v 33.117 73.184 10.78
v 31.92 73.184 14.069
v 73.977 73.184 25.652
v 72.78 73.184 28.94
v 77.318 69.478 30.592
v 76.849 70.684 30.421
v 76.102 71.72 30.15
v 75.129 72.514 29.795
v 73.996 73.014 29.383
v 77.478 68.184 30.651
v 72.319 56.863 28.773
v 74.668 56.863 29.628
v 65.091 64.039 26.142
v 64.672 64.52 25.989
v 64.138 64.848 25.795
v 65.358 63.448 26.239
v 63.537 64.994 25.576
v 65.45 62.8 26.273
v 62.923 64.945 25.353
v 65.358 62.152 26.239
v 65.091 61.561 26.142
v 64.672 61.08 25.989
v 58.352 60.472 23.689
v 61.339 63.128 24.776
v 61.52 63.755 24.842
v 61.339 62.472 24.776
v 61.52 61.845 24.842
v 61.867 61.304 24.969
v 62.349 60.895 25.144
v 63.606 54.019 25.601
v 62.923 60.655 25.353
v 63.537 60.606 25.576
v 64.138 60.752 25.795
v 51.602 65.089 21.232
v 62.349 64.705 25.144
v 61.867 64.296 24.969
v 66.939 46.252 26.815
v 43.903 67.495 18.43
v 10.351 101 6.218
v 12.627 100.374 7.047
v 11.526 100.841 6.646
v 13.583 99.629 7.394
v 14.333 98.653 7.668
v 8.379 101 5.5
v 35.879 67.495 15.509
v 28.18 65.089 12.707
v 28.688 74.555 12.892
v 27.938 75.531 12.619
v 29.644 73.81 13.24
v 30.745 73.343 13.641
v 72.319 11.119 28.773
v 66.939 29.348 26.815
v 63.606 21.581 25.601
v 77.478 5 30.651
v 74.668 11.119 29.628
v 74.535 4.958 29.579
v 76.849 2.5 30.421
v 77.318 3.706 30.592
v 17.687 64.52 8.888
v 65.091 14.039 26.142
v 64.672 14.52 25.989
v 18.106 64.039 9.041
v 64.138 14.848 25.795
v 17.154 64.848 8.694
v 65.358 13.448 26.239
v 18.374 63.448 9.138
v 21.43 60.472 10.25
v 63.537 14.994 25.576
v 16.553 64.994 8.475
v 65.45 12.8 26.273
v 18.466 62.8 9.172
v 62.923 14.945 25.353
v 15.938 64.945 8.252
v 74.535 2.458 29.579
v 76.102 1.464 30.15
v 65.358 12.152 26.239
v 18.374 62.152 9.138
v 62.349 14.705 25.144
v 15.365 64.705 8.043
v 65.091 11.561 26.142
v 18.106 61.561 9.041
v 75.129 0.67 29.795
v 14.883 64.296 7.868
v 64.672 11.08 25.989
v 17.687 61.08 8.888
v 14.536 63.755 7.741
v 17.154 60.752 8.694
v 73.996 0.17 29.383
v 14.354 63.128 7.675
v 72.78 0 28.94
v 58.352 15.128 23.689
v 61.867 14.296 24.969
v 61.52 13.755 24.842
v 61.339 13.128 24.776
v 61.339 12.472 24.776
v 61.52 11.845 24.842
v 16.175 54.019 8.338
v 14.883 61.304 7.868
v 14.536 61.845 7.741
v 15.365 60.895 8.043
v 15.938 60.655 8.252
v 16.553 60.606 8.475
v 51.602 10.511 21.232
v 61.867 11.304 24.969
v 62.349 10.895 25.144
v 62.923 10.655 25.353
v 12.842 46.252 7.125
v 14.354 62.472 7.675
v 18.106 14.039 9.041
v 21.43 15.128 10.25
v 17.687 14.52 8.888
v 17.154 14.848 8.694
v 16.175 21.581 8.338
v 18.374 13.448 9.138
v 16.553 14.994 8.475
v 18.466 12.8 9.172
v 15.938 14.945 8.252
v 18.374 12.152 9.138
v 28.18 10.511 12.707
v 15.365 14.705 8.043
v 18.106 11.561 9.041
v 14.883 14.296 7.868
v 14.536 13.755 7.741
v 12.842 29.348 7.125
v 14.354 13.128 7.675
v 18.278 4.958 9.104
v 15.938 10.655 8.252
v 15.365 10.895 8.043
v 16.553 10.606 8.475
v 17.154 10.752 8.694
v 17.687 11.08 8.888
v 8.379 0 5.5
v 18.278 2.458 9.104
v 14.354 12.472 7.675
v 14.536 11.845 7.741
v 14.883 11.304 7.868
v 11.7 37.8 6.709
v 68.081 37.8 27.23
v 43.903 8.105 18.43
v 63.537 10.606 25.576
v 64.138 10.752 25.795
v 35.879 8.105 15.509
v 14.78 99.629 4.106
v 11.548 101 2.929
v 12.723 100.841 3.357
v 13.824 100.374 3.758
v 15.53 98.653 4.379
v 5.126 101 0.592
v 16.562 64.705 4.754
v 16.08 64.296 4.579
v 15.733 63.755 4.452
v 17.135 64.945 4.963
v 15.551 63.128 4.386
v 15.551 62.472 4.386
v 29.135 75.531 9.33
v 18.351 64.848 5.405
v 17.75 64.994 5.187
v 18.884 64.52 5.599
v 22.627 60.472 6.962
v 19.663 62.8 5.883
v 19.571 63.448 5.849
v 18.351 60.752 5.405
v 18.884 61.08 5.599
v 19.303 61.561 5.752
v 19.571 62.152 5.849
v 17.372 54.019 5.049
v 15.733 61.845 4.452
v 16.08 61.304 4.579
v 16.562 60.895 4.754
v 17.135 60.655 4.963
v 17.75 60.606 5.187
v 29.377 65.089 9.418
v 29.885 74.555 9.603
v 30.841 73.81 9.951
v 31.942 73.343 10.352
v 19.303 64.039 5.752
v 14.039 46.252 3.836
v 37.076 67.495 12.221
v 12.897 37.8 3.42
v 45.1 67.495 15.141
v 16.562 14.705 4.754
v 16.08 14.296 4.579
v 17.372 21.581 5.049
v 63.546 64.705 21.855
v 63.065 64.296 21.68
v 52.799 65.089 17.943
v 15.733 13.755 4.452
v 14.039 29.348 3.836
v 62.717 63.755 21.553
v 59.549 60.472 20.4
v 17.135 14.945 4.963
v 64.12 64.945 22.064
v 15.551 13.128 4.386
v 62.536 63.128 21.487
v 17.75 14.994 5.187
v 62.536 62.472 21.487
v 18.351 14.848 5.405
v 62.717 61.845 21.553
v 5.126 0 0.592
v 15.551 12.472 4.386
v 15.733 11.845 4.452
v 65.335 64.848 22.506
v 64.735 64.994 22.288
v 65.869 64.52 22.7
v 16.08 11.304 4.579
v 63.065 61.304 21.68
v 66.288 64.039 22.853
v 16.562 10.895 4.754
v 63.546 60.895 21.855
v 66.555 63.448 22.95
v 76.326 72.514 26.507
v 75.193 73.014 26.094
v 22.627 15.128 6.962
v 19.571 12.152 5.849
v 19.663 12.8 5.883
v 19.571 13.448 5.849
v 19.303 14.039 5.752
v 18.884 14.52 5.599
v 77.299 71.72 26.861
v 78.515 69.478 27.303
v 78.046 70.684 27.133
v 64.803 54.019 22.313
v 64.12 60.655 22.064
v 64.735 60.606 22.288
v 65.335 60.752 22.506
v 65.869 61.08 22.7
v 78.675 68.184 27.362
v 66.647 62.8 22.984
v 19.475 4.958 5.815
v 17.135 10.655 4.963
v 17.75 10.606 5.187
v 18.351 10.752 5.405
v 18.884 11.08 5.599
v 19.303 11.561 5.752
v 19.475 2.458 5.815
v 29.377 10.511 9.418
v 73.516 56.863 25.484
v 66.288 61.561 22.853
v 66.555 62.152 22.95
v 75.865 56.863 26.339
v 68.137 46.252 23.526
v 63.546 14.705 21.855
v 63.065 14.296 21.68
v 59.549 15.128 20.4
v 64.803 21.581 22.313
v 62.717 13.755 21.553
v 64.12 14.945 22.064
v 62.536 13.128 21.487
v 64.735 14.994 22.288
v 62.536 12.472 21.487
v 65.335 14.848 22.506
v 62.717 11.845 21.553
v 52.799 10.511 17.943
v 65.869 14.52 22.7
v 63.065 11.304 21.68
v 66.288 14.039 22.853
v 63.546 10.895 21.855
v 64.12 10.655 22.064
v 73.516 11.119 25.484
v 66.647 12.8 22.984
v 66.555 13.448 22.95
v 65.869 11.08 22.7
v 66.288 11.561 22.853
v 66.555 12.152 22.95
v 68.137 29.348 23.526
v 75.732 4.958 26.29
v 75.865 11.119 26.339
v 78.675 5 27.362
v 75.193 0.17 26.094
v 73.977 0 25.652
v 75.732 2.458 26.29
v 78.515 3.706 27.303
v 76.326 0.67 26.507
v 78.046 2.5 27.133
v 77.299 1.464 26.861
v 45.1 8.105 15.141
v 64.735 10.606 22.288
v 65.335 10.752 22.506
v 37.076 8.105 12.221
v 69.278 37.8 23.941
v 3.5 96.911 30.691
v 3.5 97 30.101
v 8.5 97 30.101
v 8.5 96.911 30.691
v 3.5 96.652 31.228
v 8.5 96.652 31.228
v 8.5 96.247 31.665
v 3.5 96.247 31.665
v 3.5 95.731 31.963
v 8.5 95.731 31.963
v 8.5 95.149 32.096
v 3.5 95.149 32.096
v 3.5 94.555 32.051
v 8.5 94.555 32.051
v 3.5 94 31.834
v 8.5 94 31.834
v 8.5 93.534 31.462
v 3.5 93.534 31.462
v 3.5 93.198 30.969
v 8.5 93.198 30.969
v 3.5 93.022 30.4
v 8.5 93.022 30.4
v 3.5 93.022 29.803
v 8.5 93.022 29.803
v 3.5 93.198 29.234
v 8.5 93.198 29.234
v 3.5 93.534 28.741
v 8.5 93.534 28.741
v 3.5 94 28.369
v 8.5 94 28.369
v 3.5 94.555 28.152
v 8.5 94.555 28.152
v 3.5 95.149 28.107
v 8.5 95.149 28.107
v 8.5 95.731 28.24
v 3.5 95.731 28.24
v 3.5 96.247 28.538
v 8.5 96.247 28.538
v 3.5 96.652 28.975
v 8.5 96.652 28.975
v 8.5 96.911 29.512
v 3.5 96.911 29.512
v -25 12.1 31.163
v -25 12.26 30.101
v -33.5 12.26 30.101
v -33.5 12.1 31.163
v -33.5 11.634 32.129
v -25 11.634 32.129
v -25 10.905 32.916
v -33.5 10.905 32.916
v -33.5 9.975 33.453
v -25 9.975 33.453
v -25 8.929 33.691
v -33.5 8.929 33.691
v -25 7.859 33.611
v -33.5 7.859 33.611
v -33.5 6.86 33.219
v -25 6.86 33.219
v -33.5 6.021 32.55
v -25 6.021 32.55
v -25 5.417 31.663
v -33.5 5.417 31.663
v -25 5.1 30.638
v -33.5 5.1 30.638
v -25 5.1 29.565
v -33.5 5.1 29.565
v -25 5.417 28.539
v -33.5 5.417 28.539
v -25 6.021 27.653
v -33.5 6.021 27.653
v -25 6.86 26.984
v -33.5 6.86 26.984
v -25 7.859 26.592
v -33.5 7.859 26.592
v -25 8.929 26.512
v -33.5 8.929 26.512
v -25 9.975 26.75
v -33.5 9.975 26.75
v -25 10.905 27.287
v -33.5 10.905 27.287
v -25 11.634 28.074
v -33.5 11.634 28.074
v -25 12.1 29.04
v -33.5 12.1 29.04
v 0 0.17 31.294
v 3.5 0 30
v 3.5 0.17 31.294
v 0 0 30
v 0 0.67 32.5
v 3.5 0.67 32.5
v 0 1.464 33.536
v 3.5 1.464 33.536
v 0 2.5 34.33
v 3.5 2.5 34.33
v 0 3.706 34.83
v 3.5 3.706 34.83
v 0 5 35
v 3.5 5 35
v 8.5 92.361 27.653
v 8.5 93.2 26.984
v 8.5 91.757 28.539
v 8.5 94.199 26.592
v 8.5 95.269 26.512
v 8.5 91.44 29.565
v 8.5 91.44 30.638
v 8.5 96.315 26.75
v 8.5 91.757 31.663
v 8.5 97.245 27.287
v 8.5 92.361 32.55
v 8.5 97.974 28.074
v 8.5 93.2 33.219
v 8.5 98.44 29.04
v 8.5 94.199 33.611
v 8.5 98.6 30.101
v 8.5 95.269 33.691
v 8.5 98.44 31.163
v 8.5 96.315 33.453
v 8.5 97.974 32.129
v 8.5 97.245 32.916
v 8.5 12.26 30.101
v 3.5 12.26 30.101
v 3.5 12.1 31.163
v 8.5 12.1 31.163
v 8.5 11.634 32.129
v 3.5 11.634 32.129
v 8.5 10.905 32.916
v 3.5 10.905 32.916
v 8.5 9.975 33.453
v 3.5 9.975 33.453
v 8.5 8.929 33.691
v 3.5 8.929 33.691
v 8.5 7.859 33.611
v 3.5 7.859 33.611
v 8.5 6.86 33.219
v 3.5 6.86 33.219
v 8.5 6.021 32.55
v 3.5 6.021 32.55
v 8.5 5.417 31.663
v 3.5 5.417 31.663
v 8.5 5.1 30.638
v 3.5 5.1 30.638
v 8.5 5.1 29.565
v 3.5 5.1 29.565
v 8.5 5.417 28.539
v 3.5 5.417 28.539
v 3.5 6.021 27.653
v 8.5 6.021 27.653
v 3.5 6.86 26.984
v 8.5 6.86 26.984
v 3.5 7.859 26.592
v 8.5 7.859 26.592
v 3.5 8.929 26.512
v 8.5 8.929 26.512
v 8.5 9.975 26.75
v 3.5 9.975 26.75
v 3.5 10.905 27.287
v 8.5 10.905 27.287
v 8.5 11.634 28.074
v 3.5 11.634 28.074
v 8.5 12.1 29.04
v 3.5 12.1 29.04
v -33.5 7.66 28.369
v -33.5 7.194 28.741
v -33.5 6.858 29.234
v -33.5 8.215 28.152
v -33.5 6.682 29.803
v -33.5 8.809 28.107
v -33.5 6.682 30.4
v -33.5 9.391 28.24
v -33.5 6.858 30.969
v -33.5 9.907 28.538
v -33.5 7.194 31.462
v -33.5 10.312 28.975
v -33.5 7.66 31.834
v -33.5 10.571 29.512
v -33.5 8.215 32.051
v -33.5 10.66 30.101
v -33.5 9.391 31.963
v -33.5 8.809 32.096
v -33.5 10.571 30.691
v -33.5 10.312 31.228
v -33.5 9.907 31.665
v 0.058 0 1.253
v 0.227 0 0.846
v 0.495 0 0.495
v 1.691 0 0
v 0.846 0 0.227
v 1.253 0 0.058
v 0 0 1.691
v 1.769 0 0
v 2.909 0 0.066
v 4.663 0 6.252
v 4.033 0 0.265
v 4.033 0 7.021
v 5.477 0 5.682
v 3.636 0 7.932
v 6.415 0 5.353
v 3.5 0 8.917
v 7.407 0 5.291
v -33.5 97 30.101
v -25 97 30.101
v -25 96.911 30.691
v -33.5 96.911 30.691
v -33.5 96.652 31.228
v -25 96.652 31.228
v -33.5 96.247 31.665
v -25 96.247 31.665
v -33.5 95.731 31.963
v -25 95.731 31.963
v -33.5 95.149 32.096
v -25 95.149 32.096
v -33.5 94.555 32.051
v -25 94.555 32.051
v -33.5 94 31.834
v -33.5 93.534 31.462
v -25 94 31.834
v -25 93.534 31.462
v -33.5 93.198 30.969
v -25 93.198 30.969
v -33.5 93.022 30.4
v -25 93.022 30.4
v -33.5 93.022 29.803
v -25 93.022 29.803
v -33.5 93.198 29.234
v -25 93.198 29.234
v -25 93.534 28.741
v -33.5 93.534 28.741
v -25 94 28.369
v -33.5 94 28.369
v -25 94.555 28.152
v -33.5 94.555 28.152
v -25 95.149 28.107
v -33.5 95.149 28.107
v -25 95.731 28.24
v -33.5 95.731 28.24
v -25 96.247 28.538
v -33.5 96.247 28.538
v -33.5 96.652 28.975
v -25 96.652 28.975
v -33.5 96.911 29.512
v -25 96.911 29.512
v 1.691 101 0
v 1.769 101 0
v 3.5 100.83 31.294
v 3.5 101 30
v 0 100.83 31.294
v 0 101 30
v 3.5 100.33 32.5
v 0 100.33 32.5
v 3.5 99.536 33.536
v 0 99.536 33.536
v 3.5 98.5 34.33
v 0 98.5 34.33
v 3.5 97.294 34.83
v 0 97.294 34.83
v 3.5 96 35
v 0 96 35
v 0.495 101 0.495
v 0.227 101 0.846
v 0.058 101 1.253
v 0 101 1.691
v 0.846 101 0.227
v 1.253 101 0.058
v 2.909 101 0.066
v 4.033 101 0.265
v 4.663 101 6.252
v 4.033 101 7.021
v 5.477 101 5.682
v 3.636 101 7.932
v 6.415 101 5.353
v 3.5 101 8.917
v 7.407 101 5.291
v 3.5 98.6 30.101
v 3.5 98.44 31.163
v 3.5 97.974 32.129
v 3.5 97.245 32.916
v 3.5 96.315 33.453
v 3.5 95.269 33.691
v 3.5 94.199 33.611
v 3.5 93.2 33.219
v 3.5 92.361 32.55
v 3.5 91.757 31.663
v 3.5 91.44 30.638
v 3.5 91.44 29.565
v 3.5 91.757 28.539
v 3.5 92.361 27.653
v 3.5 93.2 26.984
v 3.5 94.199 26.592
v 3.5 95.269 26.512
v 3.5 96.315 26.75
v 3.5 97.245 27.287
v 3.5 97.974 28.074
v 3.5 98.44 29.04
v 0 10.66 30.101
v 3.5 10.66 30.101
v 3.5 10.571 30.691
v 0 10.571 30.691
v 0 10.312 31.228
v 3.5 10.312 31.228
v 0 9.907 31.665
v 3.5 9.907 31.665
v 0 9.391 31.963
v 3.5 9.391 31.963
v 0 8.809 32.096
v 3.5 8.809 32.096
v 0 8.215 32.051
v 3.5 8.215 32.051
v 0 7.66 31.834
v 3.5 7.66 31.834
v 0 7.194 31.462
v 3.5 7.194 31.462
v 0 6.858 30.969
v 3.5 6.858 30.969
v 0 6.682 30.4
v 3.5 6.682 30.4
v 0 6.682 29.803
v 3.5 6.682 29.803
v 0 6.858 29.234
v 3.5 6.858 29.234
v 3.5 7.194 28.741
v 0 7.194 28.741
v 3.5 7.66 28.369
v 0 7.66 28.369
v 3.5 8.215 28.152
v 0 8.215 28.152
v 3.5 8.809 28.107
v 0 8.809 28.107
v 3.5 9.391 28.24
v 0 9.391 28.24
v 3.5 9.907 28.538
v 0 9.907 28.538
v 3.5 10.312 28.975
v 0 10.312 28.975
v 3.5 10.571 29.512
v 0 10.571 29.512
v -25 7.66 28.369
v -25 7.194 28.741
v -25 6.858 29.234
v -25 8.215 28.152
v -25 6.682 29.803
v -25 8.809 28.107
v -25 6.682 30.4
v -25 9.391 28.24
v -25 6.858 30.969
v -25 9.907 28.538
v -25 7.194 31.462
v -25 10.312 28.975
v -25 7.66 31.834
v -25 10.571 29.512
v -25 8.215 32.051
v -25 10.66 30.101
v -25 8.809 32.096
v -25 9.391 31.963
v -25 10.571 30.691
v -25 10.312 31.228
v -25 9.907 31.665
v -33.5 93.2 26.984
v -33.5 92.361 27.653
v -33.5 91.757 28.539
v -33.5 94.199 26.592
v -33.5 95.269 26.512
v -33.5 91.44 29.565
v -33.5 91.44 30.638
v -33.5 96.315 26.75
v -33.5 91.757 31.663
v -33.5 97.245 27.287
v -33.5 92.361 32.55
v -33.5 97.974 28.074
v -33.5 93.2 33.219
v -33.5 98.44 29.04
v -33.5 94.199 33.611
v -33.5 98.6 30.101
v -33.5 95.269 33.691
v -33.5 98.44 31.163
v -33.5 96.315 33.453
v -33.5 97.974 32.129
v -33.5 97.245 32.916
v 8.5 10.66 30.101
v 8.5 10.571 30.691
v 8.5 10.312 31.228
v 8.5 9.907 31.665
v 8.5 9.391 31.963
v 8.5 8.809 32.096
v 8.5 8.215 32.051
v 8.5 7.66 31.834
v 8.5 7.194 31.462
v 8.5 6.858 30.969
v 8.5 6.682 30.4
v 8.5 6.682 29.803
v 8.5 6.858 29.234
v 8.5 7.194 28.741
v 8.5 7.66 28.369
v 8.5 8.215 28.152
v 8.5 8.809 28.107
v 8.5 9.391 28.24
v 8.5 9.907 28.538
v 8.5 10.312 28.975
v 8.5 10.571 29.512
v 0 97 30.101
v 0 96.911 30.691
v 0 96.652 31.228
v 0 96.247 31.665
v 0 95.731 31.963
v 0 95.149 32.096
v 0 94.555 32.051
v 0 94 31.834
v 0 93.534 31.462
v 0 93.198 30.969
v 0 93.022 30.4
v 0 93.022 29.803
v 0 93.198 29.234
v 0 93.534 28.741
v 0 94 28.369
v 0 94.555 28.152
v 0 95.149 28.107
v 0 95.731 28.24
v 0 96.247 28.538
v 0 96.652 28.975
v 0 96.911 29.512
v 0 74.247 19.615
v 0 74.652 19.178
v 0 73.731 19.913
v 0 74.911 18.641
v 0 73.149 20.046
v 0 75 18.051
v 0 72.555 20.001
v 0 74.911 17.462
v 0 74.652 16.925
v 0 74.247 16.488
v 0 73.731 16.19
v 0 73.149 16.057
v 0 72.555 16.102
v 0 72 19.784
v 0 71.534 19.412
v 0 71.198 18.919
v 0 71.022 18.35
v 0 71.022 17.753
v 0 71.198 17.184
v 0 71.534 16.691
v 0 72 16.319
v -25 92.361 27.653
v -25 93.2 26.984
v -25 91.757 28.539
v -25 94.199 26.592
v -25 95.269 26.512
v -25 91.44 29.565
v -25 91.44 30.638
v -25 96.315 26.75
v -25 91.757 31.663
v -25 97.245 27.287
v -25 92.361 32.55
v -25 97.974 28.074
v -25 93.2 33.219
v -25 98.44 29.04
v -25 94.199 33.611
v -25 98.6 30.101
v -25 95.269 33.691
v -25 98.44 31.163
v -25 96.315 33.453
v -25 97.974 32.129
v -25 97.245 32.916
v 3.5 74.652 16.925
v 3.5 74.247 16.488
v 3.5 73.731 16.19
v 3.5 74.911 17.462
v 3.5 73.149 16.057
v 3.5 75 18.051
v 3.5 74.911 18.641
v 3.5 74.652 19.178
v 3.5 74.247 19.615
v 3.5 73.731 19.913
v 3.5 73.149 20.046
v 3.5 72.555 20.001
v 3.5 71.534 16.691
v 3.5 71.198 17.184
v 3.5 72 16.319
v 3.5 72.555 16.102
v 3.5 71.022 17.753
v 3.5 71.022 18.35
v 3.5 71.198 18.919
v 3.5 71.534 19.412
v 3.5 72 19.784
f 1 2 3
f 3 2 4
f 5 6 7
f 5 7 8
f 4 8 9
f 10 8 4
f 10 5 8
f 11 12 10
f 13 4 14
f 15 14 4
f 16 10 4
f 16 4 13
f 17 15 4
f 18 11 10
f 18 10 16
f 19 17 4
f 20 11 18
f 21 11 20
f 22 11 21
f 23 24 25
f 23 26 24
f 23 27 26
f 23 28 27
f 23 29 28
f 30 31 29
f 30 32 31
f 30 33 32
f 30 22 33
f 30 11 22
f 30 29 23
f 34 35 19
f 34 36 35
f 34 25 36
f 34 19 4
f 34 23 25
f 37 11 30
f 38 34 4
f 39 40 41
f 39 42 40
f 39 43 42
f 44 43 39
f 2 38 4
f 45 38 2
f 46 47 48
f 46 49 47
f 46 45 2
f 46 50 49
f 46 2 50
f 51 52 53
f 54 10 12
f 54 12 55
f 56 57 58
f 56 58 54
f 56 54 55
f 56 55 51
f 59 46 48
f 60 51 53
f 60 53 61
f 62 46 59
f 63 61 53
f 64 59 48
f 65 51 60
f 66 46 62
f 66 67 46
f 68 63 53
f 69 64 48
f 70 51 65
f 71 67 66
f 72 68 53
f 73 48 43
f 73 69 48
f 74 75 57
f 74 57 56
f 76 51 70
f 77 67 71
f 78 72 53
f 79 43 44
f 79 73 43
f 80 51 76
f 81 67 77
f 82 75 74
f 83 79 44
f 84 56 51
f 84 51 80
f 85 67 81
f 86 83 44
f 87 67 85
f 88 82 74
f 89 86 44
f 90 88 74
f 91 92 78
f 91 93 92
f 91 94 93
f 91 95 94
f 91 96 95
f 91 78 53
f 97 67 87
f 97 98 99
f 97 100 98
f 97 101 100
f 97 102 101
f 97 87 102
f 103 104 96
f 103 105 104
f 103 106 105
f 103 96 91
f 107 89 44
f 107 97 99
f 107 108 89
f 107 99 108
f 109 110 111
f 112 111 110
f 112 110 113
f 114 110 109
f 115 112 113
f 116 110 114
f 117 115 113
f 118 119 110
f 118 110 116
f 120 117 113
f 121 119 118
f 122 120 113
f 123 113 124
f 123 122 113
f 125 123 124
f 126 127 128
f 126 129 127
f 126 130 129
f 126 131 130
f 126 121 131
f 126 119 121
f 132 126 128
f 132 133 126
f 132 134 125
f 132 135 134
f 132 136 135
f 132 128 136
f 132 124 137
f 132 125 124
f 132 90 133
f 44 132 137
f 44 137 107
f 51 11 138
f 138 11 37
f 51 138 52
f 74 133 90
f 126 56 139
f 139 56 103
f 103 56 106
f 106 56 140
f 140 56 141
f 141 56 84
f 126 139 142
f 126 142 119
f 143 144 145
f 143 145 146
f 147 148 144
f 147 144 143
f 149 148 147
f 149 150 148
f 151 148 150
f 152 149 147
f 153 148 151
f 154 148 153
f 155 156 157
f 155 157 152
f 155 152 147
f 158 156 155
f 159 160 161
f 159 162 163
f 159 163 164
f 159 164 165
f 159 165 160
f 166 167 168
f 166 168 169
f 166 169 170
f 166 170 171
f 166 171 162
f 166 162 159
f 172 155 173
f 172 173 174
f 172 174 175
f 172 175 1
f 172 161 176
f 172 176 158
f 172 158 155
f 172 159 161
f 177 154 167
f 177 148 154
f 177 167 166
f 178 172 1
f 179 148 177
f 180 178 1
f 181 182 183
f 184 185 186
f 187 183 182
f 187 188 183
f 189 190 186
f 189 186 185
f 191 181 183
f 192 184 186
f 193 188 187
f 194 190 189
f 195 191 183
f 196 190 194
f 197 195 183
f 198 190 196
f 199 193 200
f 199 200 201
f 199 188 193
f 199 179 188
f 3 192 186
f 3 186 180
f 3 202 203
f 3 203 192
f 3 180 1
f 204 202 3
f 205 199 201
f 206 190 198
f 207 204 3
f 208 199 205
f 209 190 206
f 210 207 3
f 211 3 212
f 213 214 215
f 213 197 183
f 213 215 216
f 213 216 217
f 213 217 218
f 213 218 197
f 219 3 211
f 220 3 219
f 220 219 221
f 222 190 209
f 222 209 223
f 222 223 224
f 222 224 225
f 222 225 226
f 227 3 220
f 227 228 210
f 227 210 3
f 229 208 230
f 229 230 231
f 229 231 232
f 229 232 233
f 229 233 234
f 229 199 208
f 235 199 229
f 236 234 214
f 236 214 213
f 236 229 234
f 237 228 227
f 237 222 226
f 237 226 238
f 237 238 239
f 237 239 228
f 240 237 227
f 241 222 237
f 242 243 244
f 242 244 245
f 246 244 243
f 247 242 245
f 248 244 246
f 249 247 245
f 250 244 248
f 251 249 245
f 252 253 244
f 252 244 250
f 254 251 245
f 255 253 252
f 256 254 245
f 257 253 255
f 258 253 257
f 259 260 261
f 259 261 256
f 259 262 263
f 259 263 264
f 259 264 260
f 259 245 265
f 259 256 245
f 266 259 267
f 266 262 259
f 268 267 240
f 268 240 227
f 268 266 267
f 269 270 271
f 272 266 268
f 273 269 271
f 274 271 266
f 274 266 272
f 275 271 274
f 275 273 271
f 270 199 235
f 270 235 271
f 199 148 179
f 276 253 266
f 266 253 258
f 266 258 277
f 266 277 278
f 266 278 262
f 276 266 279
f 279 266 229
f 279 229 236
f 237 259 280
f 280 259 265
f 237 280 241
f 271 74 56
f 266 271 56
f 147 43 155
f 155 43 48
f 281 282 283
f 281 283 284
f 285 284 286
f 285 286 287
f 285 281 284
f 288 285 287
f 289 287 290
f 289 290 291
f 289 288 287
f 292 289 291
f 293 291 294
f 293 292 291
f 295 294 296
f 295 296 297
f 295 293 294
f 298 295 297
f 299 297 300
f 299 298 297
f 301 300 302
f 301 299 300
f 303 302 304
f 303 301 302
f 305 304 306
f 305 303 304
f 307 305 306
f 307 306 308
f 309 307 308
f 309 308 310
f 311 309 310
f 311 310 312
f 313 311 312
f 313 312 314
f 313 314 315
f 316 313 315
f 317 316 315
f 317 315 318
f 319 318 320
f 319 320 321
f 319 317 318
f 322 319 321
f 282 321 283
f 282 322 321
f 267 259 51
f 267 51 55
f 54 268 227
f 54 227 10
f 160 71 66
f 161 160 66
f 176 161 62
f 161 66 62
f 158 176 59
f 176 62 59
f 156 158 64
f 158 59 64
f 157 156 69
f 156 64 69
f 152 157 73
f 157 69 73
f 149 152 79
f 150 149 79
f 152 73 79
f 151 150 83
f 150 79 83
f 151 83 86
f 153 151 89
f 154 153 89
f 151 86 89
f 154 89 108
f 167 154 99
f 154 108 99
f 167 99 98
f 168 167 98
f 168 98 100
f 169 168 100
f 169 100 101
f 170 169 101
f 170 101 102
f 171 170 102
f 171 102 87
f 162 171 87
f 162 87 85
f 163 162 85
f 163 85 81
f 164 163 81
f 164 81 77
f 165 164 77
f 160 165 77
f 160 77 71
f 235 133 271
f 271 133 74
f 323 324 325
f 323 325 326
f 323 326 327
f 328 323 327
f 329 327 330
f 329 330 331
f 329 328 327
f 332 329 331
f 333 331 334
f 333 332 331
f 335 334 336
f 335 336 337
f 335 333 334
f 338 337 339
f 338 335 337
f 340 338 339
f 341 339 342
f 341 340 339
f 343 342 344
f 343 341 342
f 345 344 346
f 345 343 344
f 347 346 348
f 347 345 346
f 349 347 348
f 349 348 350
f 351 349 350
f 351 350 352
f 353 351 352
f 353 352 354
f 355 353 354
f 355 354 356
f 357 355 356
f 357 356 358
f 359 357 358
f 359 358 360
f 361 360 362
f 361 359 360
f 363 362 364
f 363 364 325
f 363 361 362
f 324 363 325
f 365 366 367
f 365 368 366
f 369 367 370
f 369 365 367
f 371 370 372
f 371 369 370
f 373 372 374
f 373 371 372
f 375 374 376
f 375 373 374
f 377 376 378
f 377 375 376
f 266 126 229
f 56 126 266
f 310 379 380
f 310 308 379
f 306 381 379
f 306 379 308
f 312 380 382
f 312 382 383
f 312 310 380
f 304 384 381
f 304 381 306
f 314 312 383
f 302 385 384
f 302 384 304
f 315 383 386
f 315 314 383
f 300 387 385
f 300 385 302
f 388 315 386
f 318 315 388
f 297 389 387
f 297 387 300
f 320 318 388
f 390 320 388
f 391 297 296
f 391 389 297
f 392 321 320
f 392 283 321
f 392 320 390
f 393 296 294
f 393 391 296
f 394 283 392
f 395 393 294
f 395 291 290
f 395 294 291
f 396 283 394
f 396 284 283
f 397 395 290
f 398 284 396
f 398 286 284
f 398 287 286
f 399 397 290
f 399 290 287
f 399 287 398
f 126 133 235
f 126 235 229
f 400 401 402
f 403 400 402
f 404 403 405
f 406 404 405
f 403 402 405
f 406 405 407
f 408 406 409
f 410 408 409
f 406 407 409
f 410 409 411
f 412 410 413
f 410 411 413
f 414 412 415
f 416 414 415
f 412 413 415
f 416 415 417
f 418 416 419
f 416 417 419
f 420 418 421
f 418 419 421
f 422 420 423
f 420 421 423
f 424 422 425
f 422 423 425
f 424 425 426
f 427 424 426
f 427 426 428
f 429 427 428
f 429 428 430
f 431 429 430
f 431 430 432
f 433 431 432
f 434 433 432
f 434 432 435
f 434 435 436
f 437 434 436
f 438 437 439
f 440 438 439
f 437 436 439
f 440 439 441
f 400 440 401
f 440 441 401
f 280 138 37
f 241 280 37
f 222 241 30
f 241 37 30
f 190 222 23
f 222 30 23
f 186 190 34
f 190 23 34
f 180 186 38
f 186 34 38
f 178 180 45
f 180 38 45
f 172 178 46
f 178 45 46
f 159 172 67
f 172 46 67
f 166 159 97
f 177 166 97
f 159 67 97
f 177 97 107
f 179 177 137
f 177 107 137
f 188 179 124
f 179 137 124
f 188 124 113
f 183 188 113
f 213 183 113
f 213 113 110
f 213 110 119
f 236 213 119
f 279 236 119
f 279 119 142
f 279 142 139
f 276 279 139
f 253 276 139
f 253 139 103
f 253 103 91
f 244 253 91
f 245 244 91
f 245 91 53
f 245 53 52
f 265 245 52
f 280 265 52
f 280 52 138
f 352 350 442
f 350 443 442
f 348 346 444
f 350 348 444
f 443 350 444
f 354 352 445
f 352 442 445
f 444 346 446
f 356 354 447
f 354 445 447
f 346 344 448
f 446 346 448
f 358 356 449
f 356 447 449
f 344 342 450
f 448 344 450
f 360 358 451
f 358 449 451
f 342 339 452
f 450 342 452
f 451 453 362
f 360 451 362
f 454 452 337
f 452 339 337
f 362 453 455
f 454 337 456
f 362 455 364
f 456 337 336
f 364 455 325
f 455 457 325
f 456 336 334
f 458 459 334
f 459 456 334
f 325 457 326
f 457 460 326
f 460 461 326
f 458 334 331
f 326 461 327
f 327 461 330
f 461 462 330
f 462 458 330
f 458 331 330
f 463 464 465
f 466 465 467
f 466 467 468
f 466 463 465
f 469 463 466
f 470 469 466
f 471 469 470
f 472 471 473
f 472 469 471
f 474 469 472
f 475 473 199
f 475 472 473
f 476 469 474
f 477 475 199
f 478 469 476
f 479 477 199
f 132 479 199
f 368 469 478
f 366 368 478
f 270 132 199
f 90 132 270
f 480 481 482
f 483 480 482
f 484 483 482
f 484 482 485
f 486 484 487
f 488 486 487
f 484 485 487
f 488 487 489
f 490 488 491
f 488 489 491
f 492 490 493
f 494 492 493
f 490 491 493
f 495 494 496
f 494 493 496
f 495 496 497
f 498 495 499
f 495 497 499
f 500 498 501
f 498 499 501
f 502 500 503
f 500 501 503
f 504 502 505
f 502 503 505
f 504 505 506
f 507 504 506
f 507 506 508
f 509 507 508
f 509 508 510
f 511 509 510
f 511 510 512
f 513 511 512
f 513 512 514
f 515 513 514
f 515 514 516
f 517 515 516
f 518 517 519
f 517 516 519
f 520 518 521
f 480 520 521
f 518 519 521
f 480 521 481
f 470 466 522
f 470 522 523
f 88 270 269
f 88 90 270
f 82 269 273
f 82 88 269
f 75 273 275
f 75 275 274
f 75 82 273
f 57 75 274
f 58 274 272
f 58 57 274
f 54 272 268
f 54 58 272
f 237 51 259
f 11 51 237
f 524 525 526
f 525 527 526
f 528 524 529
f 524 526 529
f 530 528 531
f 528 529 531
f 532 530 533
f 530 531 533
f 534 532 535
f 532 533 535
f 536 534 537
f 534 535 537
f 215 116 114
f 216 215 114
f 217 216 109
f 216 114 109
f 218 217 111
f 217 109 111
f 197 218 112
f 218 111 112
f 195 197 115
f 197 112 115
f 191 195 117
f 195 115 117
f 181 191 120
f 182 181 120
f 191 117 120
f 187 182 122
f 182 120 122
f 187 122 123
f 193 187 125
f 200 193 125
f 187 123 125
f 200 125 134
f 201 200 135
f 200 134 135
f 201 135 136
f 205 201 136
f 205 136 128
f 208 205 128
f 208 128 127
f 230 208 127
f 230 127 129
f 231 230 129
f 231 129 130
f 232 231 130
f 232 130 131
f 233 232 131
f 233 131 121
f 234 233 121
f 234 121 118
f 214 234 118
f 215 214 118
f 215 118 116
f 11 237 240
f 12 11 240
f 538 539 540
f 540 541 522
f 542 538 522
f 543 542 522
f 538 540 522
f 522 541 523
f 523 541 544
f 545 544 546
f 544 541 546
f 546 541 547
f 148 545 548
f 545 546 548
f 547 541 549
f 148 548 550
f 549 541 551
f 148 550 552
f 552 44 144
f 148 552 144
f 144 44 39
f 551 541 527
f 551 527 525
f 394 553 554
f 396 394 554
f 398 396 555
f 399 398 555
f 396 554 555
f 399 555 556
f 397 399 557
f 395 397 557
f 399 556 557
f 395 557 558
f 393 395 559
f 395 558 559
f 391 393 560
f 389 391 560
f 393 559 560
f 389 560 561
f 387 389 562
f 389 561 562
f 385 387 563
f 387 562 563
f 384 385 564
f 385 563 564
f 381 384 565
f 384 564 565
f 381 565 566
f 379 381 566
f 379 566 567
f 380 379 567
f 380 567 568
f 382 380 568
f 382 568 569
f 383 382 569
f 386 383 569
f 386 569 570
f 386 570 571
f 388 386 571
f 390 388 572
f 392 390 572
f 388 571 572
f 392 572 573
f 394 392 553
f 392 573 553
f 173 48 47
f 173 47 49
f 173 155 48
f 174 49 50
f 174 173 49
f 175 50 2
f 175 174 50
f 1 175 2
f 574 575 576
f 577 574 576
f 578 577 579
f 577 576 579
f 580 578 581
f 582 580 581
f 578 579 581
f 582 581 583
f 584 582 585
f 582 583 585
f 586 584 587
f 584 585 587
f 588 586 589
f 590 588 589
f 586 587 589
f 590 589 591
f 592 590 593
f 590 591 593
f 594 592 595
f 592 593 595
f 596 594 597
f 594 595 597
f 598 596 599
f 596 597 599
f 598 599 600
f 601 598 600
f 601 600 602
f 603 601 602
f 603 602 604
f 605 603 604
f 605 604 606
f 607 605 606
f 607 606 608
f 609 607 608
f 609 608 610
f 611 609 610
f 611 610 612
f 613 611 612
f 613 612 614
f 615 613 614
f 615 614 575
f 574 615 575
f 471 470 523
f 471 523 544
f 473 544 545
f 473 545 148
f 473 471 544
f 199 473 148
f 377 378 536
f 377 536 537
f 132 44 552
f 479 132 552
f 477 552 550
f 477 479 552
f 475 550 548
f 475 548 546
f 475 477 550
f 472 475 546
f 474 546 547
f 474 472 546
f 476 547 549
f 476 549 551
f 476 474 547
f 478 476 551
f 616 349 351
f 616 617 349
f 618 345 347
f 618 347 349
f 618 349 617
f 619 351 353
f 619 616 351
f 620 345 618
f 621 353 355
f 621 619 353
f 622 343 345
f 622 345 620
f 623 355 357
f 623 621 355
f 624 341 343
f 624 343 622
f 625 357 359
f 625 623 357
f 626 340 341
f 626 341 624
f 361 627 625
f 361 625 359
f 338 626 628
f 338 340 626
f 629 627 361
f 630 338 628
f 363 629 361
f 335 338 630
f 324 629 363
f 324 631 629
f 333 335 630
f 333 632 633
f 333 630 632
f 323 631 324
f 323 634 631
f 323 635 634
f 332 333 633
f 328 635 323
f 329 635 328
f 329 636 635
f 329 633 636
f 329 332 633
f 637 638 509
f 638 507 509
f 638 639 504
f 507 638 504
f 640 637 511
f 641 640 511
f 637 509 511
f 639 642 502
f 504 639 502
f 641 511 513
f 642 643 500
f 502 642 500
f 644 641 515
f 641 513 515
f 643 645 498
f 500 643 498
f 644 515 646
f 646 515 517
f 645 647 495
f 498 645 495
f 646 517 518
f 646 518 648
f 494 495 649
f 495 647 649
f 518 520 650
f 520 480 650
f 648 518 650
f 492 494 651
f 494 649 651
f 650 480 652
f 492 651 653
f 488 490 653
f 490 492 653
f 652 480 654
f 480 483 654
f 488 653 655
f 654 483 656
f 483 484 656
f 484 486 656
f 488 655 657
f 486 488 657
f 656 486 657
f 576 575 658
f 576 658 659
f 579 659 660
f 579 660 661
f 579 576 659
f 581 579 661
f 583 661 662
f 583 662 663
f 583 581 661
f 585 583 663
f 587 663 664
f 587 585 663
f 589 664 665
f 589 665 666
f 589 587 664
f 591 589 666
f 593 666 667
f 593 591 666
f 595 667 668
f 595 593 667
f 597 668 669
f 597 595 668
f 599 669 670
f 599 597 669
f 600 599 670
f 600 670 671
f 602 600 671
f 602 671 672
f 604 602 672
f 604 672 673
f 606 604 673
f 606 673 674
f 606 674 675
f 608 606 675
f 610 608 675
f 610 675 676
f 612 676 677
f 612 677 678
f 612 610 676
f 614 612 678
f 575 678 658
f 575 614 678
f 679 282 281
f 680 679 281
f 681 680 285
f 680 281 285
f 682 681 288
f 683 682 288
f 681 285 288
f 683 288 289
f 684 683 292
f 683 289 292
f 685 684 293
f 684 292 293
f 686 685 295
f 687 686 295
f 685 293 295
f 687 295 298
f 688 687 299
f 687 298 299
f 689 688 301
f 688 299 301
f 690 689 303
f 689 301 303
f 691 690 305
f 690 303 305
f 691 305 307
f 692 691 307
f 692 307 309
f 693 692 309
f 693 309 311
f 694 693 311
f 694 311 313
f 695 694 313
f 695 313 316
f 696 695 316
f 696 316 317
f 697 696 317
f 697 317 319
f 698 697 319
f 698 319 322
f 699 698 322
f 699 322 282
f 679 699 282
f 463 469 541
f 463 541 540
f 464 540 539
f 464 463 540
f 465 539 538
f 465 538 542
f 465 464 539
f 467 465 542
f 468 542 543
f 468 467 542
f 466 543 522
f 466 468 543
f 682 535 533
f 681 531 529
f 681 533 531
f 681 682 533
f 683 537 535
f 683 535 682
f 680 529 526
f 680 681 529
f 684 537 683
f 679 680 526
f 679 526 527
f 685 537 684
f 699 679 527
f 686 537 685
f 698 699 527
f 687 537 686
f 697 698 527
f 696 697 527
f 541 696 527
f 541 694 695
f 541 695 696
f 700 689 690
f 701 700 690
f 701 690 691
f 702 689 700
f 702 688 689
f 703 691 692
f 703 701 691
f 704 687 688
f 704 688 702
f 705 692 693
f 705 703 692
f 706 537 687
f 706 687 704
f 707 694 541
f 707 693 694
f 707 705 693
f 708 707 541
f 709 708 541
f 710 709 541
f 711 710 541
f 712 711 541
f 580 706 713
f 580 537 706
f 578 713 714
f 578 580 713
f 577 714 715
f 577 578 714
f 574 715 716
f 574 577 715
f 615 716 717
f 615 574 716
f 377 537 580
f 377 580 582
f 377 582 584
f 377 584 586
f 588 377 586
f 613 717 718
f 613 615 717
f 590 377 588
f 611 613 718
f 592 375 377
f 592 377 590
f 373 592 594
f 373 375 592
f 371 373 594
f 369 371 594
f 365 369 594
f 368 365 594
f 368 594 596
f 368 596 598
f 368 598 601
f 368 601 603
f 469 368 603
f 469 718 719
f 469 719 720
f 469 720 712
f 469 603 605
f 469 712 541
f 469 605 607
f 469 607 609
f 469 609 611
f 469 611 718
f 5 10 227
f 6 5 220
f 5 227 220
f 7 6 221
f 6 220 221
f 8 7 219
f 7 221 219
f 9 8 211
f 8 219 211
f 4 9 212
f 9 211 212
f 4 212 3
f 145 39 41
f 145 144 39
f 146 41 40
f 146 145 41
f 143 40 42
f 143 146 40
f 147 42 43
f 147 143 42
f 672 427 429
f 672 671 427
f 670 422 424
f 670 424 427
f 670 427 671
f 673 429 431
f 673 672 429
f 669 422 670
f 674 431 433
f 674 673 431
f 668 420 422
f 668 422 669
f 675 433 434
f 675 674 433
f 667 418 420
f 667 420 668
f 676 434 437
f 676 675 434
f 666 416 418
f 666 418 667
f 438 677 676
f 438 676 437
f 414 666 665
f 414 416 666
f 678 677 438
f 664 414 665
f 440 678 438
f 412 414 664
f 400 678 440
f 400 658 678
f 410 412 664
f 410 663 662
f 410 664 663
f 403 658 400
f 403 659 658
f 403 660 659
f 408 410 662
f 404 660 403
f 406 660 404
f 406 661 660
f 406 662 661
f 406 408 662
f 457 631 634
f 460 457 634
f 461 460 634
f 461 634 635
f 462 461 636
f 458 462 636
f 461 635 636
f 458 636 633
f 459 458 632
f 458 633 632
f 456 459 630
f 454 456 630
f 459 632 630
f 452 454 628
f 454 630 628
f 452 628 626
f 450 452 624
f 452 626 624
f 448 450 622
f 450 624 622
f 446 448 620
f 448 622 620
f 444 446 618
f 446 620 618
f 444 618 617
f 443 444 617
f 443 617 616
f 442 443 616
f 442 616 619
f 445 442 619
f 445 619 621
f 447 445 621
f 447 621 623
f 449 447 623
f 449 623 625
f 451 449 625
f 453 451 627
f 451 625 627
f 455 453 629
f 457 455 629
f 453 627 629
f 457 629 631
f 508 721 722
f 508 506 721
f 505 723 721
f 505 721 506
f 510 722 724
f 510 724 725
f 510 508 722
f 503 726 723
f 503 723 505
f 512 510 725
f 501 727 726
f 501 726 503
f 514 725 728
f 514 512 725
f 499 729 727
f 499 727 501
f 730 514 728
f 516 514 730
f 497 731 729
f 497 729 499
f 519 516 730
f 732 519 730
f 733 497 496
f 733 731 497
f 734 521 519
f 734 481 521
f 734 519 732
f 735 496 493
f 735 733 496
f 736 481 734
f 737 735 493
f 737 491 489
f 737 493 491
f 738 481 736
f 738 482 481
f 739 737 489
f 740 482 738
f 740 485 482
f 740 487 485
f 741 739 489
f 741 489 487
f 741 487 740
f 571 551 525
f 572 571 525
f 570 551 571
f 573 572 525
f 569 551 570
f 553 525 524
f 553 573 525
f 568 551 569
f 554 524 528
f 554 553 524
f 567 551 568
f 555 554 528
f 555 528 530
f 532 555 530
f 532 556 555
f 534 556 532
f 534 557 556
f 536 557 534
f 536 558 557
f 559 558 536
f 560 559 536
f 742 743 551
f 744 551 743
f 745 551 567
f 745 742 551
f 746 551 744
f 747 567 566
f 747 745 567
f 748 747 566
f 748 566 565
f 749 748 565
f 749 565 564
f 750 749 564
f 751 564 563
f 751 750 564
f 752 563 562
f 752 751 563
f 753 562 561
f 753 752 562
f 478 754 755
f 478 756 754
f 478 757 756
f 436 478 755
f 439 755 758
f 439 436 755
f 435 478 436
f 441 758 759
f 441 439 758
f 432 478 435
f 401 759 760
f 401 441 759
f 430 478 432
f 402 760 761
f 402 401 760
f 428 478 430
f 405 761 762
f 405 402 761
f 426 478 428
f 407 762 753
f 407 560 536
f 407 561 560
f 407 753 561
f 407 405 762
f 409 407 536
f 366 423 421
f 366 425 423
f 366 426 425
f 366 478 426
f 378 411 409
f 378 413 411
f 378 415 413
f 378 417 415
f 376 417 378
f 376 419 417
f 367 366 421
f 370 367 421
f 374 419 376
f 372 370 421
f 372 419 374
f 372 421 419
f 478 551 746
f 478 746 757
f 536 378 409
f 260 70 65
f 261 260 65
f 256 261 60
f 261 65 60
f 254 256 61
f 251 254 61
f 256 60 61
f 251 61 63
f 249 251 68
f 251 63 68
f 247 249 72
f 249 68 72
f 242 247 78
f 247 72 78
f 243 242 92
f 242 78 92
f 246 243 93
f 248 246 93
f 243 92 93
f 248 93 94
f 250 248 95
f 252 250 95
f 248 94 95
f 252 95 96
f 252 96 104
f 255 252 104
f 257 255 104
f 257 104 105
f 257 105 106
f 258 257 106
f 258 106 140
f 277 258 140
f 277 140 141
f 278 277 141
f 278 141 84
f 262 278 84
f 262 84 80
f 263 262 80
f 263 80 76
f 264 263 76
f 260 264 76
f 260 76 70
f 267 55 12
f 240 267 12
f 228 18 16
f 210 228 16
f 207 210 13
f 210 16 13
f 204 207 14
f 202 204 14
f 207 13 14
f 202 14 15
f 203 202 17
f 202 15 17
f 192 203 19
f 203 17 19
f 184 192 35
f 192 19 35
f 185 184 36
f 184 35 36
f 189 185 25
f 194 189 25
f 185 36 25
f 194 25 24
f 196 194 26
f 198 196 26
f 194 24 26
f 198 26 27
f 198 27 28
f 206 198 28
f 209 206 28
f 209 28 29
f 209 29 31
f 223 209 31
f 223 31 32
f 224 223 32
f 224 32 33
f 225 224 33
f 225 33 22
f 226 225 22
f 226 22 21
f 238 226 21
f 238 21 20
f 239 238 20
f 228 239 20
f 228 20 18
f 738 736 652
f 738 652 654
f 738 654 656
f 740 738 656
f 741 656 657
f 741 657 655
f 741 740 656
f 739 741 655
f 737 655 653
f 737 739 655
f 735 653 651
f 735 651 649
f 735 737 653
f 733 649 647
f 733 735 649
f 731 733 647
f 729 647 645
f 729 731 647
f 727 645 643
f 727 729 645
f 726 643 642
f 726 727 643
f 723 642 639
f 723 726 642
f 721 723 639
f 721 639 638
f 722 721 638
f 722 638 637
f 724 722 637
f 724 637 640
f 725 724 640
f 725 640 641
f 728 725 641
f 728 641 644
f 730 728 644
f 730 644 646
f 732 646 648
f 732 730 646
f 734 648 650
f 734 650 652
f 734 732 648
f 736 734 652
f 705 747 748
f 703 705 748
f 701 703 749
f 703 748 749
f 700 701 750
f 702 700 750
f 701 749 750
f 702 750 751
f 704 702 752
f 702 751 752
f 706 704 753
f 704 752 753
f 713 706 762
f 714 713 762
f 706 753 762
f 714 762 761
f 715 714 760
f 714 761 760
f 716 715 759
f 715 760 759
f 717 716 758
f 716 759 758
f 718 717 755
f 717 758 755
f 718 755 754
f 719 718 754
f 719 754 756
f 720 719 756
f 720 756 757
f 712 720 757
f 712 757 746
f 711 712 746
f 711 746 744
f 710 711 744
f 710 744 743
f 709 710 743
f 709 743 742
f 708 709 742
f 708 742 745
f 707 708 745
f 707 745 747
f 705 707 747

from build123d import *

# Parameters (mm, degrees)
F1_DEPTH  = 101
F2_R      = 2
F3_DEPTH  = 3.501
F4_R      = 3.6
F4_R_2    = 2
F5_DEPTH  = 5
F7_D      = 4.4
F7_DEPTH  = 29.2125043875
F8_R      = 30
F9_DEPTH  = 29.2125043875
F10_W     = 2.5
F10_H     = 45.7440251485
F10_W_2   = 59.867
F10_H_2   = 2.5
F11_DEPTH = 29.2125043875
F12_R     = 5
F16_R     = 3.6
F16_R_2   = 2
F17_DEPTH = 8.5


with BuildPart() as f1:
    # F0 (on Front) → F1 (new body)
    with BuildSketch(Plane.XZ):
        with BuildLine():
            ThreePointArc((0, 1.6910881801), (0.4953082604, 0.4953082604), (1.6910881801, 0))
            Line((1.6910881801, 0), (1.7692948072, 0))
            ThreePointArc((1.7692948072, 0), (3.4737066992, 0.1491167185), (5.1263308984, 0.5919360381))
            Line((5.1263308984, 0.5919360381), (78.6754096629, 27.3616114661))
            Line((78.6754096629, 27.3616114661), (77.4783391612, 30.6505356388))
            Line((77.4783391612, 30.6505356388), (8.3789960821, 5.5004315507))
            ThreePointArc((8.3789960821, 5.5004315507), (5.0502888736, 5.9386641684), (3.5, 8.9167413863))
            Line((3.5, 8.9167413863), (3.5, 35))
            Line((3.5, 35), (0, 35))
            Line((0, 35), (0, 1.6910881801))
        make_face()
    extrude(amount=-F1_DEPTH)

    # F2 (on face) → F3 (cut, through all)
    with BuildSketch(Plane.YZ.offset(3.5)):
        with Locations((95, 30.1014762372)):
            Circle(F2_R)
        with Locations((73, 18.0514762372)):
            Circle(F2_R)
        with Locations((8.66, 30.1014762372)):
            Circle(F2_R)
    extrude(amount=-F3_DEPTH, mode=Mode.SUBTRACT)

    # F4 (on face) → F5 (join)
    with BuildSketch(Plane.YZ.offset(3.5)):
        with Locations((8.66, 30.1014762372)):
            Circle(F4_R)
        with Locations((8.66, 30.1014762372)):
            Circle(F4_R_2, mode=Mode.SUBTRACT)
        with Locations((95, 30.1014762372)):
            Circle(F4_R)
        with Locations((95, 30.1014762372)):
            Circle(F4_R_2, mode=Mode.SUBTRACT)
    extrude(amount=F5_DEPTH)

    # F7 (through all, one way)
    with BuildSketch(Plane(origin=(-0.7876482771, 0, 2.1640458558), x_dir=(0.9396926208, 0, 0.3420201433), z_dir=(-0.3420201433, 0, 0.9396926208))):
        with Locations((18.2889241728, 12.8), (18.2889241728, 62.8), (68.2889241728, 62.8), (68.2889241728, 12.8)):
            Circle(F7_D / 2)
    extrude(amount=-F7_DEPTH, mode=Mode.SUBTRACT)

    # F8 (on face) → F9 (cut, through all)
    with BuildSketch(Plane(origin=(-0.7876482771, 0, 2.1640458558), x_dir=(0.9396926208, 0, 0.3420201433), z_dir=(-0.3420201433, 0, 0.9396926208))):
        with Locations((43.2889241728, 37.8)):
            Circle(F8_R)
    extrude(amount=-F9_DEPTH, mode=Mode.SUBTRACT)

    # F10 (on face) → F11 (cut, through all)
    with BuildSketch(Plane(origin=(-0.7876482771, 0, 2.1640458558), x_dir=(0.9396926208, 0, 0.3420201433), z_dir=(-0.3420201433, 0, 0.9396926208))):
        Polygon((83.2889241728, 101), (14.622095041, 101), (32.038141042, 73.1842829585), (83.2889241728, 73.1842829585), align=None)
        with Locations((79.0480536222, 33.9913400821)):
            Rectangle(F10_W, F10_H)
        with Locations((50.2231278352, 3.7078128941)):
            Rectangle(F10_W_2, F10_H_2)
    extrude(amount=-F11_DEPTH, mode=Mode.SUBTRACT)

    # F12
    f12_edges = [f1.edges().sort_by_distance(p)[0] for p in [
        (13.551162, 101, 5.520635),
        (29.916892, 73.184283, 11.477273),
        (78.076874, 73.184283, 29.006074),
        (78.076874, 0, 29.006074),
        (1.75, 0, 35),
        (1.75, 101, 35),
    ]]
    fillet(f12_edges, radius=F12_R)


with BuildPart() as f17:
    # F16 (on offset) → F17 (new body)
    with BuildSketch(Plane.YZ.offset(-25)):
        with Locations((95, 30.1014762372)):
            Circle(F16_R)
        with Locations((95, 30.1014762372)):
            Circle(F16_R_2, mode=Mode.SUBTRACT)
    extrude(amount=-F17_DEPTH)


with BuildPart() as f17b:
    # F16 (on offset) → F17, piece 2 (new body)
    with BuildSketch(Plane.YZ.offset(-25)):
        with Locations((8.66, 30.1014762372)):
            Circle(F16_R)
        with Locations((8.66, 30.1014762372)):
            Circle(F16_R_2, mode=Mode.SUBTRACT)
    extrude(amount=-F17_DEPTH)


solid = Compound([f1.part, f17.part, f17b.part])
